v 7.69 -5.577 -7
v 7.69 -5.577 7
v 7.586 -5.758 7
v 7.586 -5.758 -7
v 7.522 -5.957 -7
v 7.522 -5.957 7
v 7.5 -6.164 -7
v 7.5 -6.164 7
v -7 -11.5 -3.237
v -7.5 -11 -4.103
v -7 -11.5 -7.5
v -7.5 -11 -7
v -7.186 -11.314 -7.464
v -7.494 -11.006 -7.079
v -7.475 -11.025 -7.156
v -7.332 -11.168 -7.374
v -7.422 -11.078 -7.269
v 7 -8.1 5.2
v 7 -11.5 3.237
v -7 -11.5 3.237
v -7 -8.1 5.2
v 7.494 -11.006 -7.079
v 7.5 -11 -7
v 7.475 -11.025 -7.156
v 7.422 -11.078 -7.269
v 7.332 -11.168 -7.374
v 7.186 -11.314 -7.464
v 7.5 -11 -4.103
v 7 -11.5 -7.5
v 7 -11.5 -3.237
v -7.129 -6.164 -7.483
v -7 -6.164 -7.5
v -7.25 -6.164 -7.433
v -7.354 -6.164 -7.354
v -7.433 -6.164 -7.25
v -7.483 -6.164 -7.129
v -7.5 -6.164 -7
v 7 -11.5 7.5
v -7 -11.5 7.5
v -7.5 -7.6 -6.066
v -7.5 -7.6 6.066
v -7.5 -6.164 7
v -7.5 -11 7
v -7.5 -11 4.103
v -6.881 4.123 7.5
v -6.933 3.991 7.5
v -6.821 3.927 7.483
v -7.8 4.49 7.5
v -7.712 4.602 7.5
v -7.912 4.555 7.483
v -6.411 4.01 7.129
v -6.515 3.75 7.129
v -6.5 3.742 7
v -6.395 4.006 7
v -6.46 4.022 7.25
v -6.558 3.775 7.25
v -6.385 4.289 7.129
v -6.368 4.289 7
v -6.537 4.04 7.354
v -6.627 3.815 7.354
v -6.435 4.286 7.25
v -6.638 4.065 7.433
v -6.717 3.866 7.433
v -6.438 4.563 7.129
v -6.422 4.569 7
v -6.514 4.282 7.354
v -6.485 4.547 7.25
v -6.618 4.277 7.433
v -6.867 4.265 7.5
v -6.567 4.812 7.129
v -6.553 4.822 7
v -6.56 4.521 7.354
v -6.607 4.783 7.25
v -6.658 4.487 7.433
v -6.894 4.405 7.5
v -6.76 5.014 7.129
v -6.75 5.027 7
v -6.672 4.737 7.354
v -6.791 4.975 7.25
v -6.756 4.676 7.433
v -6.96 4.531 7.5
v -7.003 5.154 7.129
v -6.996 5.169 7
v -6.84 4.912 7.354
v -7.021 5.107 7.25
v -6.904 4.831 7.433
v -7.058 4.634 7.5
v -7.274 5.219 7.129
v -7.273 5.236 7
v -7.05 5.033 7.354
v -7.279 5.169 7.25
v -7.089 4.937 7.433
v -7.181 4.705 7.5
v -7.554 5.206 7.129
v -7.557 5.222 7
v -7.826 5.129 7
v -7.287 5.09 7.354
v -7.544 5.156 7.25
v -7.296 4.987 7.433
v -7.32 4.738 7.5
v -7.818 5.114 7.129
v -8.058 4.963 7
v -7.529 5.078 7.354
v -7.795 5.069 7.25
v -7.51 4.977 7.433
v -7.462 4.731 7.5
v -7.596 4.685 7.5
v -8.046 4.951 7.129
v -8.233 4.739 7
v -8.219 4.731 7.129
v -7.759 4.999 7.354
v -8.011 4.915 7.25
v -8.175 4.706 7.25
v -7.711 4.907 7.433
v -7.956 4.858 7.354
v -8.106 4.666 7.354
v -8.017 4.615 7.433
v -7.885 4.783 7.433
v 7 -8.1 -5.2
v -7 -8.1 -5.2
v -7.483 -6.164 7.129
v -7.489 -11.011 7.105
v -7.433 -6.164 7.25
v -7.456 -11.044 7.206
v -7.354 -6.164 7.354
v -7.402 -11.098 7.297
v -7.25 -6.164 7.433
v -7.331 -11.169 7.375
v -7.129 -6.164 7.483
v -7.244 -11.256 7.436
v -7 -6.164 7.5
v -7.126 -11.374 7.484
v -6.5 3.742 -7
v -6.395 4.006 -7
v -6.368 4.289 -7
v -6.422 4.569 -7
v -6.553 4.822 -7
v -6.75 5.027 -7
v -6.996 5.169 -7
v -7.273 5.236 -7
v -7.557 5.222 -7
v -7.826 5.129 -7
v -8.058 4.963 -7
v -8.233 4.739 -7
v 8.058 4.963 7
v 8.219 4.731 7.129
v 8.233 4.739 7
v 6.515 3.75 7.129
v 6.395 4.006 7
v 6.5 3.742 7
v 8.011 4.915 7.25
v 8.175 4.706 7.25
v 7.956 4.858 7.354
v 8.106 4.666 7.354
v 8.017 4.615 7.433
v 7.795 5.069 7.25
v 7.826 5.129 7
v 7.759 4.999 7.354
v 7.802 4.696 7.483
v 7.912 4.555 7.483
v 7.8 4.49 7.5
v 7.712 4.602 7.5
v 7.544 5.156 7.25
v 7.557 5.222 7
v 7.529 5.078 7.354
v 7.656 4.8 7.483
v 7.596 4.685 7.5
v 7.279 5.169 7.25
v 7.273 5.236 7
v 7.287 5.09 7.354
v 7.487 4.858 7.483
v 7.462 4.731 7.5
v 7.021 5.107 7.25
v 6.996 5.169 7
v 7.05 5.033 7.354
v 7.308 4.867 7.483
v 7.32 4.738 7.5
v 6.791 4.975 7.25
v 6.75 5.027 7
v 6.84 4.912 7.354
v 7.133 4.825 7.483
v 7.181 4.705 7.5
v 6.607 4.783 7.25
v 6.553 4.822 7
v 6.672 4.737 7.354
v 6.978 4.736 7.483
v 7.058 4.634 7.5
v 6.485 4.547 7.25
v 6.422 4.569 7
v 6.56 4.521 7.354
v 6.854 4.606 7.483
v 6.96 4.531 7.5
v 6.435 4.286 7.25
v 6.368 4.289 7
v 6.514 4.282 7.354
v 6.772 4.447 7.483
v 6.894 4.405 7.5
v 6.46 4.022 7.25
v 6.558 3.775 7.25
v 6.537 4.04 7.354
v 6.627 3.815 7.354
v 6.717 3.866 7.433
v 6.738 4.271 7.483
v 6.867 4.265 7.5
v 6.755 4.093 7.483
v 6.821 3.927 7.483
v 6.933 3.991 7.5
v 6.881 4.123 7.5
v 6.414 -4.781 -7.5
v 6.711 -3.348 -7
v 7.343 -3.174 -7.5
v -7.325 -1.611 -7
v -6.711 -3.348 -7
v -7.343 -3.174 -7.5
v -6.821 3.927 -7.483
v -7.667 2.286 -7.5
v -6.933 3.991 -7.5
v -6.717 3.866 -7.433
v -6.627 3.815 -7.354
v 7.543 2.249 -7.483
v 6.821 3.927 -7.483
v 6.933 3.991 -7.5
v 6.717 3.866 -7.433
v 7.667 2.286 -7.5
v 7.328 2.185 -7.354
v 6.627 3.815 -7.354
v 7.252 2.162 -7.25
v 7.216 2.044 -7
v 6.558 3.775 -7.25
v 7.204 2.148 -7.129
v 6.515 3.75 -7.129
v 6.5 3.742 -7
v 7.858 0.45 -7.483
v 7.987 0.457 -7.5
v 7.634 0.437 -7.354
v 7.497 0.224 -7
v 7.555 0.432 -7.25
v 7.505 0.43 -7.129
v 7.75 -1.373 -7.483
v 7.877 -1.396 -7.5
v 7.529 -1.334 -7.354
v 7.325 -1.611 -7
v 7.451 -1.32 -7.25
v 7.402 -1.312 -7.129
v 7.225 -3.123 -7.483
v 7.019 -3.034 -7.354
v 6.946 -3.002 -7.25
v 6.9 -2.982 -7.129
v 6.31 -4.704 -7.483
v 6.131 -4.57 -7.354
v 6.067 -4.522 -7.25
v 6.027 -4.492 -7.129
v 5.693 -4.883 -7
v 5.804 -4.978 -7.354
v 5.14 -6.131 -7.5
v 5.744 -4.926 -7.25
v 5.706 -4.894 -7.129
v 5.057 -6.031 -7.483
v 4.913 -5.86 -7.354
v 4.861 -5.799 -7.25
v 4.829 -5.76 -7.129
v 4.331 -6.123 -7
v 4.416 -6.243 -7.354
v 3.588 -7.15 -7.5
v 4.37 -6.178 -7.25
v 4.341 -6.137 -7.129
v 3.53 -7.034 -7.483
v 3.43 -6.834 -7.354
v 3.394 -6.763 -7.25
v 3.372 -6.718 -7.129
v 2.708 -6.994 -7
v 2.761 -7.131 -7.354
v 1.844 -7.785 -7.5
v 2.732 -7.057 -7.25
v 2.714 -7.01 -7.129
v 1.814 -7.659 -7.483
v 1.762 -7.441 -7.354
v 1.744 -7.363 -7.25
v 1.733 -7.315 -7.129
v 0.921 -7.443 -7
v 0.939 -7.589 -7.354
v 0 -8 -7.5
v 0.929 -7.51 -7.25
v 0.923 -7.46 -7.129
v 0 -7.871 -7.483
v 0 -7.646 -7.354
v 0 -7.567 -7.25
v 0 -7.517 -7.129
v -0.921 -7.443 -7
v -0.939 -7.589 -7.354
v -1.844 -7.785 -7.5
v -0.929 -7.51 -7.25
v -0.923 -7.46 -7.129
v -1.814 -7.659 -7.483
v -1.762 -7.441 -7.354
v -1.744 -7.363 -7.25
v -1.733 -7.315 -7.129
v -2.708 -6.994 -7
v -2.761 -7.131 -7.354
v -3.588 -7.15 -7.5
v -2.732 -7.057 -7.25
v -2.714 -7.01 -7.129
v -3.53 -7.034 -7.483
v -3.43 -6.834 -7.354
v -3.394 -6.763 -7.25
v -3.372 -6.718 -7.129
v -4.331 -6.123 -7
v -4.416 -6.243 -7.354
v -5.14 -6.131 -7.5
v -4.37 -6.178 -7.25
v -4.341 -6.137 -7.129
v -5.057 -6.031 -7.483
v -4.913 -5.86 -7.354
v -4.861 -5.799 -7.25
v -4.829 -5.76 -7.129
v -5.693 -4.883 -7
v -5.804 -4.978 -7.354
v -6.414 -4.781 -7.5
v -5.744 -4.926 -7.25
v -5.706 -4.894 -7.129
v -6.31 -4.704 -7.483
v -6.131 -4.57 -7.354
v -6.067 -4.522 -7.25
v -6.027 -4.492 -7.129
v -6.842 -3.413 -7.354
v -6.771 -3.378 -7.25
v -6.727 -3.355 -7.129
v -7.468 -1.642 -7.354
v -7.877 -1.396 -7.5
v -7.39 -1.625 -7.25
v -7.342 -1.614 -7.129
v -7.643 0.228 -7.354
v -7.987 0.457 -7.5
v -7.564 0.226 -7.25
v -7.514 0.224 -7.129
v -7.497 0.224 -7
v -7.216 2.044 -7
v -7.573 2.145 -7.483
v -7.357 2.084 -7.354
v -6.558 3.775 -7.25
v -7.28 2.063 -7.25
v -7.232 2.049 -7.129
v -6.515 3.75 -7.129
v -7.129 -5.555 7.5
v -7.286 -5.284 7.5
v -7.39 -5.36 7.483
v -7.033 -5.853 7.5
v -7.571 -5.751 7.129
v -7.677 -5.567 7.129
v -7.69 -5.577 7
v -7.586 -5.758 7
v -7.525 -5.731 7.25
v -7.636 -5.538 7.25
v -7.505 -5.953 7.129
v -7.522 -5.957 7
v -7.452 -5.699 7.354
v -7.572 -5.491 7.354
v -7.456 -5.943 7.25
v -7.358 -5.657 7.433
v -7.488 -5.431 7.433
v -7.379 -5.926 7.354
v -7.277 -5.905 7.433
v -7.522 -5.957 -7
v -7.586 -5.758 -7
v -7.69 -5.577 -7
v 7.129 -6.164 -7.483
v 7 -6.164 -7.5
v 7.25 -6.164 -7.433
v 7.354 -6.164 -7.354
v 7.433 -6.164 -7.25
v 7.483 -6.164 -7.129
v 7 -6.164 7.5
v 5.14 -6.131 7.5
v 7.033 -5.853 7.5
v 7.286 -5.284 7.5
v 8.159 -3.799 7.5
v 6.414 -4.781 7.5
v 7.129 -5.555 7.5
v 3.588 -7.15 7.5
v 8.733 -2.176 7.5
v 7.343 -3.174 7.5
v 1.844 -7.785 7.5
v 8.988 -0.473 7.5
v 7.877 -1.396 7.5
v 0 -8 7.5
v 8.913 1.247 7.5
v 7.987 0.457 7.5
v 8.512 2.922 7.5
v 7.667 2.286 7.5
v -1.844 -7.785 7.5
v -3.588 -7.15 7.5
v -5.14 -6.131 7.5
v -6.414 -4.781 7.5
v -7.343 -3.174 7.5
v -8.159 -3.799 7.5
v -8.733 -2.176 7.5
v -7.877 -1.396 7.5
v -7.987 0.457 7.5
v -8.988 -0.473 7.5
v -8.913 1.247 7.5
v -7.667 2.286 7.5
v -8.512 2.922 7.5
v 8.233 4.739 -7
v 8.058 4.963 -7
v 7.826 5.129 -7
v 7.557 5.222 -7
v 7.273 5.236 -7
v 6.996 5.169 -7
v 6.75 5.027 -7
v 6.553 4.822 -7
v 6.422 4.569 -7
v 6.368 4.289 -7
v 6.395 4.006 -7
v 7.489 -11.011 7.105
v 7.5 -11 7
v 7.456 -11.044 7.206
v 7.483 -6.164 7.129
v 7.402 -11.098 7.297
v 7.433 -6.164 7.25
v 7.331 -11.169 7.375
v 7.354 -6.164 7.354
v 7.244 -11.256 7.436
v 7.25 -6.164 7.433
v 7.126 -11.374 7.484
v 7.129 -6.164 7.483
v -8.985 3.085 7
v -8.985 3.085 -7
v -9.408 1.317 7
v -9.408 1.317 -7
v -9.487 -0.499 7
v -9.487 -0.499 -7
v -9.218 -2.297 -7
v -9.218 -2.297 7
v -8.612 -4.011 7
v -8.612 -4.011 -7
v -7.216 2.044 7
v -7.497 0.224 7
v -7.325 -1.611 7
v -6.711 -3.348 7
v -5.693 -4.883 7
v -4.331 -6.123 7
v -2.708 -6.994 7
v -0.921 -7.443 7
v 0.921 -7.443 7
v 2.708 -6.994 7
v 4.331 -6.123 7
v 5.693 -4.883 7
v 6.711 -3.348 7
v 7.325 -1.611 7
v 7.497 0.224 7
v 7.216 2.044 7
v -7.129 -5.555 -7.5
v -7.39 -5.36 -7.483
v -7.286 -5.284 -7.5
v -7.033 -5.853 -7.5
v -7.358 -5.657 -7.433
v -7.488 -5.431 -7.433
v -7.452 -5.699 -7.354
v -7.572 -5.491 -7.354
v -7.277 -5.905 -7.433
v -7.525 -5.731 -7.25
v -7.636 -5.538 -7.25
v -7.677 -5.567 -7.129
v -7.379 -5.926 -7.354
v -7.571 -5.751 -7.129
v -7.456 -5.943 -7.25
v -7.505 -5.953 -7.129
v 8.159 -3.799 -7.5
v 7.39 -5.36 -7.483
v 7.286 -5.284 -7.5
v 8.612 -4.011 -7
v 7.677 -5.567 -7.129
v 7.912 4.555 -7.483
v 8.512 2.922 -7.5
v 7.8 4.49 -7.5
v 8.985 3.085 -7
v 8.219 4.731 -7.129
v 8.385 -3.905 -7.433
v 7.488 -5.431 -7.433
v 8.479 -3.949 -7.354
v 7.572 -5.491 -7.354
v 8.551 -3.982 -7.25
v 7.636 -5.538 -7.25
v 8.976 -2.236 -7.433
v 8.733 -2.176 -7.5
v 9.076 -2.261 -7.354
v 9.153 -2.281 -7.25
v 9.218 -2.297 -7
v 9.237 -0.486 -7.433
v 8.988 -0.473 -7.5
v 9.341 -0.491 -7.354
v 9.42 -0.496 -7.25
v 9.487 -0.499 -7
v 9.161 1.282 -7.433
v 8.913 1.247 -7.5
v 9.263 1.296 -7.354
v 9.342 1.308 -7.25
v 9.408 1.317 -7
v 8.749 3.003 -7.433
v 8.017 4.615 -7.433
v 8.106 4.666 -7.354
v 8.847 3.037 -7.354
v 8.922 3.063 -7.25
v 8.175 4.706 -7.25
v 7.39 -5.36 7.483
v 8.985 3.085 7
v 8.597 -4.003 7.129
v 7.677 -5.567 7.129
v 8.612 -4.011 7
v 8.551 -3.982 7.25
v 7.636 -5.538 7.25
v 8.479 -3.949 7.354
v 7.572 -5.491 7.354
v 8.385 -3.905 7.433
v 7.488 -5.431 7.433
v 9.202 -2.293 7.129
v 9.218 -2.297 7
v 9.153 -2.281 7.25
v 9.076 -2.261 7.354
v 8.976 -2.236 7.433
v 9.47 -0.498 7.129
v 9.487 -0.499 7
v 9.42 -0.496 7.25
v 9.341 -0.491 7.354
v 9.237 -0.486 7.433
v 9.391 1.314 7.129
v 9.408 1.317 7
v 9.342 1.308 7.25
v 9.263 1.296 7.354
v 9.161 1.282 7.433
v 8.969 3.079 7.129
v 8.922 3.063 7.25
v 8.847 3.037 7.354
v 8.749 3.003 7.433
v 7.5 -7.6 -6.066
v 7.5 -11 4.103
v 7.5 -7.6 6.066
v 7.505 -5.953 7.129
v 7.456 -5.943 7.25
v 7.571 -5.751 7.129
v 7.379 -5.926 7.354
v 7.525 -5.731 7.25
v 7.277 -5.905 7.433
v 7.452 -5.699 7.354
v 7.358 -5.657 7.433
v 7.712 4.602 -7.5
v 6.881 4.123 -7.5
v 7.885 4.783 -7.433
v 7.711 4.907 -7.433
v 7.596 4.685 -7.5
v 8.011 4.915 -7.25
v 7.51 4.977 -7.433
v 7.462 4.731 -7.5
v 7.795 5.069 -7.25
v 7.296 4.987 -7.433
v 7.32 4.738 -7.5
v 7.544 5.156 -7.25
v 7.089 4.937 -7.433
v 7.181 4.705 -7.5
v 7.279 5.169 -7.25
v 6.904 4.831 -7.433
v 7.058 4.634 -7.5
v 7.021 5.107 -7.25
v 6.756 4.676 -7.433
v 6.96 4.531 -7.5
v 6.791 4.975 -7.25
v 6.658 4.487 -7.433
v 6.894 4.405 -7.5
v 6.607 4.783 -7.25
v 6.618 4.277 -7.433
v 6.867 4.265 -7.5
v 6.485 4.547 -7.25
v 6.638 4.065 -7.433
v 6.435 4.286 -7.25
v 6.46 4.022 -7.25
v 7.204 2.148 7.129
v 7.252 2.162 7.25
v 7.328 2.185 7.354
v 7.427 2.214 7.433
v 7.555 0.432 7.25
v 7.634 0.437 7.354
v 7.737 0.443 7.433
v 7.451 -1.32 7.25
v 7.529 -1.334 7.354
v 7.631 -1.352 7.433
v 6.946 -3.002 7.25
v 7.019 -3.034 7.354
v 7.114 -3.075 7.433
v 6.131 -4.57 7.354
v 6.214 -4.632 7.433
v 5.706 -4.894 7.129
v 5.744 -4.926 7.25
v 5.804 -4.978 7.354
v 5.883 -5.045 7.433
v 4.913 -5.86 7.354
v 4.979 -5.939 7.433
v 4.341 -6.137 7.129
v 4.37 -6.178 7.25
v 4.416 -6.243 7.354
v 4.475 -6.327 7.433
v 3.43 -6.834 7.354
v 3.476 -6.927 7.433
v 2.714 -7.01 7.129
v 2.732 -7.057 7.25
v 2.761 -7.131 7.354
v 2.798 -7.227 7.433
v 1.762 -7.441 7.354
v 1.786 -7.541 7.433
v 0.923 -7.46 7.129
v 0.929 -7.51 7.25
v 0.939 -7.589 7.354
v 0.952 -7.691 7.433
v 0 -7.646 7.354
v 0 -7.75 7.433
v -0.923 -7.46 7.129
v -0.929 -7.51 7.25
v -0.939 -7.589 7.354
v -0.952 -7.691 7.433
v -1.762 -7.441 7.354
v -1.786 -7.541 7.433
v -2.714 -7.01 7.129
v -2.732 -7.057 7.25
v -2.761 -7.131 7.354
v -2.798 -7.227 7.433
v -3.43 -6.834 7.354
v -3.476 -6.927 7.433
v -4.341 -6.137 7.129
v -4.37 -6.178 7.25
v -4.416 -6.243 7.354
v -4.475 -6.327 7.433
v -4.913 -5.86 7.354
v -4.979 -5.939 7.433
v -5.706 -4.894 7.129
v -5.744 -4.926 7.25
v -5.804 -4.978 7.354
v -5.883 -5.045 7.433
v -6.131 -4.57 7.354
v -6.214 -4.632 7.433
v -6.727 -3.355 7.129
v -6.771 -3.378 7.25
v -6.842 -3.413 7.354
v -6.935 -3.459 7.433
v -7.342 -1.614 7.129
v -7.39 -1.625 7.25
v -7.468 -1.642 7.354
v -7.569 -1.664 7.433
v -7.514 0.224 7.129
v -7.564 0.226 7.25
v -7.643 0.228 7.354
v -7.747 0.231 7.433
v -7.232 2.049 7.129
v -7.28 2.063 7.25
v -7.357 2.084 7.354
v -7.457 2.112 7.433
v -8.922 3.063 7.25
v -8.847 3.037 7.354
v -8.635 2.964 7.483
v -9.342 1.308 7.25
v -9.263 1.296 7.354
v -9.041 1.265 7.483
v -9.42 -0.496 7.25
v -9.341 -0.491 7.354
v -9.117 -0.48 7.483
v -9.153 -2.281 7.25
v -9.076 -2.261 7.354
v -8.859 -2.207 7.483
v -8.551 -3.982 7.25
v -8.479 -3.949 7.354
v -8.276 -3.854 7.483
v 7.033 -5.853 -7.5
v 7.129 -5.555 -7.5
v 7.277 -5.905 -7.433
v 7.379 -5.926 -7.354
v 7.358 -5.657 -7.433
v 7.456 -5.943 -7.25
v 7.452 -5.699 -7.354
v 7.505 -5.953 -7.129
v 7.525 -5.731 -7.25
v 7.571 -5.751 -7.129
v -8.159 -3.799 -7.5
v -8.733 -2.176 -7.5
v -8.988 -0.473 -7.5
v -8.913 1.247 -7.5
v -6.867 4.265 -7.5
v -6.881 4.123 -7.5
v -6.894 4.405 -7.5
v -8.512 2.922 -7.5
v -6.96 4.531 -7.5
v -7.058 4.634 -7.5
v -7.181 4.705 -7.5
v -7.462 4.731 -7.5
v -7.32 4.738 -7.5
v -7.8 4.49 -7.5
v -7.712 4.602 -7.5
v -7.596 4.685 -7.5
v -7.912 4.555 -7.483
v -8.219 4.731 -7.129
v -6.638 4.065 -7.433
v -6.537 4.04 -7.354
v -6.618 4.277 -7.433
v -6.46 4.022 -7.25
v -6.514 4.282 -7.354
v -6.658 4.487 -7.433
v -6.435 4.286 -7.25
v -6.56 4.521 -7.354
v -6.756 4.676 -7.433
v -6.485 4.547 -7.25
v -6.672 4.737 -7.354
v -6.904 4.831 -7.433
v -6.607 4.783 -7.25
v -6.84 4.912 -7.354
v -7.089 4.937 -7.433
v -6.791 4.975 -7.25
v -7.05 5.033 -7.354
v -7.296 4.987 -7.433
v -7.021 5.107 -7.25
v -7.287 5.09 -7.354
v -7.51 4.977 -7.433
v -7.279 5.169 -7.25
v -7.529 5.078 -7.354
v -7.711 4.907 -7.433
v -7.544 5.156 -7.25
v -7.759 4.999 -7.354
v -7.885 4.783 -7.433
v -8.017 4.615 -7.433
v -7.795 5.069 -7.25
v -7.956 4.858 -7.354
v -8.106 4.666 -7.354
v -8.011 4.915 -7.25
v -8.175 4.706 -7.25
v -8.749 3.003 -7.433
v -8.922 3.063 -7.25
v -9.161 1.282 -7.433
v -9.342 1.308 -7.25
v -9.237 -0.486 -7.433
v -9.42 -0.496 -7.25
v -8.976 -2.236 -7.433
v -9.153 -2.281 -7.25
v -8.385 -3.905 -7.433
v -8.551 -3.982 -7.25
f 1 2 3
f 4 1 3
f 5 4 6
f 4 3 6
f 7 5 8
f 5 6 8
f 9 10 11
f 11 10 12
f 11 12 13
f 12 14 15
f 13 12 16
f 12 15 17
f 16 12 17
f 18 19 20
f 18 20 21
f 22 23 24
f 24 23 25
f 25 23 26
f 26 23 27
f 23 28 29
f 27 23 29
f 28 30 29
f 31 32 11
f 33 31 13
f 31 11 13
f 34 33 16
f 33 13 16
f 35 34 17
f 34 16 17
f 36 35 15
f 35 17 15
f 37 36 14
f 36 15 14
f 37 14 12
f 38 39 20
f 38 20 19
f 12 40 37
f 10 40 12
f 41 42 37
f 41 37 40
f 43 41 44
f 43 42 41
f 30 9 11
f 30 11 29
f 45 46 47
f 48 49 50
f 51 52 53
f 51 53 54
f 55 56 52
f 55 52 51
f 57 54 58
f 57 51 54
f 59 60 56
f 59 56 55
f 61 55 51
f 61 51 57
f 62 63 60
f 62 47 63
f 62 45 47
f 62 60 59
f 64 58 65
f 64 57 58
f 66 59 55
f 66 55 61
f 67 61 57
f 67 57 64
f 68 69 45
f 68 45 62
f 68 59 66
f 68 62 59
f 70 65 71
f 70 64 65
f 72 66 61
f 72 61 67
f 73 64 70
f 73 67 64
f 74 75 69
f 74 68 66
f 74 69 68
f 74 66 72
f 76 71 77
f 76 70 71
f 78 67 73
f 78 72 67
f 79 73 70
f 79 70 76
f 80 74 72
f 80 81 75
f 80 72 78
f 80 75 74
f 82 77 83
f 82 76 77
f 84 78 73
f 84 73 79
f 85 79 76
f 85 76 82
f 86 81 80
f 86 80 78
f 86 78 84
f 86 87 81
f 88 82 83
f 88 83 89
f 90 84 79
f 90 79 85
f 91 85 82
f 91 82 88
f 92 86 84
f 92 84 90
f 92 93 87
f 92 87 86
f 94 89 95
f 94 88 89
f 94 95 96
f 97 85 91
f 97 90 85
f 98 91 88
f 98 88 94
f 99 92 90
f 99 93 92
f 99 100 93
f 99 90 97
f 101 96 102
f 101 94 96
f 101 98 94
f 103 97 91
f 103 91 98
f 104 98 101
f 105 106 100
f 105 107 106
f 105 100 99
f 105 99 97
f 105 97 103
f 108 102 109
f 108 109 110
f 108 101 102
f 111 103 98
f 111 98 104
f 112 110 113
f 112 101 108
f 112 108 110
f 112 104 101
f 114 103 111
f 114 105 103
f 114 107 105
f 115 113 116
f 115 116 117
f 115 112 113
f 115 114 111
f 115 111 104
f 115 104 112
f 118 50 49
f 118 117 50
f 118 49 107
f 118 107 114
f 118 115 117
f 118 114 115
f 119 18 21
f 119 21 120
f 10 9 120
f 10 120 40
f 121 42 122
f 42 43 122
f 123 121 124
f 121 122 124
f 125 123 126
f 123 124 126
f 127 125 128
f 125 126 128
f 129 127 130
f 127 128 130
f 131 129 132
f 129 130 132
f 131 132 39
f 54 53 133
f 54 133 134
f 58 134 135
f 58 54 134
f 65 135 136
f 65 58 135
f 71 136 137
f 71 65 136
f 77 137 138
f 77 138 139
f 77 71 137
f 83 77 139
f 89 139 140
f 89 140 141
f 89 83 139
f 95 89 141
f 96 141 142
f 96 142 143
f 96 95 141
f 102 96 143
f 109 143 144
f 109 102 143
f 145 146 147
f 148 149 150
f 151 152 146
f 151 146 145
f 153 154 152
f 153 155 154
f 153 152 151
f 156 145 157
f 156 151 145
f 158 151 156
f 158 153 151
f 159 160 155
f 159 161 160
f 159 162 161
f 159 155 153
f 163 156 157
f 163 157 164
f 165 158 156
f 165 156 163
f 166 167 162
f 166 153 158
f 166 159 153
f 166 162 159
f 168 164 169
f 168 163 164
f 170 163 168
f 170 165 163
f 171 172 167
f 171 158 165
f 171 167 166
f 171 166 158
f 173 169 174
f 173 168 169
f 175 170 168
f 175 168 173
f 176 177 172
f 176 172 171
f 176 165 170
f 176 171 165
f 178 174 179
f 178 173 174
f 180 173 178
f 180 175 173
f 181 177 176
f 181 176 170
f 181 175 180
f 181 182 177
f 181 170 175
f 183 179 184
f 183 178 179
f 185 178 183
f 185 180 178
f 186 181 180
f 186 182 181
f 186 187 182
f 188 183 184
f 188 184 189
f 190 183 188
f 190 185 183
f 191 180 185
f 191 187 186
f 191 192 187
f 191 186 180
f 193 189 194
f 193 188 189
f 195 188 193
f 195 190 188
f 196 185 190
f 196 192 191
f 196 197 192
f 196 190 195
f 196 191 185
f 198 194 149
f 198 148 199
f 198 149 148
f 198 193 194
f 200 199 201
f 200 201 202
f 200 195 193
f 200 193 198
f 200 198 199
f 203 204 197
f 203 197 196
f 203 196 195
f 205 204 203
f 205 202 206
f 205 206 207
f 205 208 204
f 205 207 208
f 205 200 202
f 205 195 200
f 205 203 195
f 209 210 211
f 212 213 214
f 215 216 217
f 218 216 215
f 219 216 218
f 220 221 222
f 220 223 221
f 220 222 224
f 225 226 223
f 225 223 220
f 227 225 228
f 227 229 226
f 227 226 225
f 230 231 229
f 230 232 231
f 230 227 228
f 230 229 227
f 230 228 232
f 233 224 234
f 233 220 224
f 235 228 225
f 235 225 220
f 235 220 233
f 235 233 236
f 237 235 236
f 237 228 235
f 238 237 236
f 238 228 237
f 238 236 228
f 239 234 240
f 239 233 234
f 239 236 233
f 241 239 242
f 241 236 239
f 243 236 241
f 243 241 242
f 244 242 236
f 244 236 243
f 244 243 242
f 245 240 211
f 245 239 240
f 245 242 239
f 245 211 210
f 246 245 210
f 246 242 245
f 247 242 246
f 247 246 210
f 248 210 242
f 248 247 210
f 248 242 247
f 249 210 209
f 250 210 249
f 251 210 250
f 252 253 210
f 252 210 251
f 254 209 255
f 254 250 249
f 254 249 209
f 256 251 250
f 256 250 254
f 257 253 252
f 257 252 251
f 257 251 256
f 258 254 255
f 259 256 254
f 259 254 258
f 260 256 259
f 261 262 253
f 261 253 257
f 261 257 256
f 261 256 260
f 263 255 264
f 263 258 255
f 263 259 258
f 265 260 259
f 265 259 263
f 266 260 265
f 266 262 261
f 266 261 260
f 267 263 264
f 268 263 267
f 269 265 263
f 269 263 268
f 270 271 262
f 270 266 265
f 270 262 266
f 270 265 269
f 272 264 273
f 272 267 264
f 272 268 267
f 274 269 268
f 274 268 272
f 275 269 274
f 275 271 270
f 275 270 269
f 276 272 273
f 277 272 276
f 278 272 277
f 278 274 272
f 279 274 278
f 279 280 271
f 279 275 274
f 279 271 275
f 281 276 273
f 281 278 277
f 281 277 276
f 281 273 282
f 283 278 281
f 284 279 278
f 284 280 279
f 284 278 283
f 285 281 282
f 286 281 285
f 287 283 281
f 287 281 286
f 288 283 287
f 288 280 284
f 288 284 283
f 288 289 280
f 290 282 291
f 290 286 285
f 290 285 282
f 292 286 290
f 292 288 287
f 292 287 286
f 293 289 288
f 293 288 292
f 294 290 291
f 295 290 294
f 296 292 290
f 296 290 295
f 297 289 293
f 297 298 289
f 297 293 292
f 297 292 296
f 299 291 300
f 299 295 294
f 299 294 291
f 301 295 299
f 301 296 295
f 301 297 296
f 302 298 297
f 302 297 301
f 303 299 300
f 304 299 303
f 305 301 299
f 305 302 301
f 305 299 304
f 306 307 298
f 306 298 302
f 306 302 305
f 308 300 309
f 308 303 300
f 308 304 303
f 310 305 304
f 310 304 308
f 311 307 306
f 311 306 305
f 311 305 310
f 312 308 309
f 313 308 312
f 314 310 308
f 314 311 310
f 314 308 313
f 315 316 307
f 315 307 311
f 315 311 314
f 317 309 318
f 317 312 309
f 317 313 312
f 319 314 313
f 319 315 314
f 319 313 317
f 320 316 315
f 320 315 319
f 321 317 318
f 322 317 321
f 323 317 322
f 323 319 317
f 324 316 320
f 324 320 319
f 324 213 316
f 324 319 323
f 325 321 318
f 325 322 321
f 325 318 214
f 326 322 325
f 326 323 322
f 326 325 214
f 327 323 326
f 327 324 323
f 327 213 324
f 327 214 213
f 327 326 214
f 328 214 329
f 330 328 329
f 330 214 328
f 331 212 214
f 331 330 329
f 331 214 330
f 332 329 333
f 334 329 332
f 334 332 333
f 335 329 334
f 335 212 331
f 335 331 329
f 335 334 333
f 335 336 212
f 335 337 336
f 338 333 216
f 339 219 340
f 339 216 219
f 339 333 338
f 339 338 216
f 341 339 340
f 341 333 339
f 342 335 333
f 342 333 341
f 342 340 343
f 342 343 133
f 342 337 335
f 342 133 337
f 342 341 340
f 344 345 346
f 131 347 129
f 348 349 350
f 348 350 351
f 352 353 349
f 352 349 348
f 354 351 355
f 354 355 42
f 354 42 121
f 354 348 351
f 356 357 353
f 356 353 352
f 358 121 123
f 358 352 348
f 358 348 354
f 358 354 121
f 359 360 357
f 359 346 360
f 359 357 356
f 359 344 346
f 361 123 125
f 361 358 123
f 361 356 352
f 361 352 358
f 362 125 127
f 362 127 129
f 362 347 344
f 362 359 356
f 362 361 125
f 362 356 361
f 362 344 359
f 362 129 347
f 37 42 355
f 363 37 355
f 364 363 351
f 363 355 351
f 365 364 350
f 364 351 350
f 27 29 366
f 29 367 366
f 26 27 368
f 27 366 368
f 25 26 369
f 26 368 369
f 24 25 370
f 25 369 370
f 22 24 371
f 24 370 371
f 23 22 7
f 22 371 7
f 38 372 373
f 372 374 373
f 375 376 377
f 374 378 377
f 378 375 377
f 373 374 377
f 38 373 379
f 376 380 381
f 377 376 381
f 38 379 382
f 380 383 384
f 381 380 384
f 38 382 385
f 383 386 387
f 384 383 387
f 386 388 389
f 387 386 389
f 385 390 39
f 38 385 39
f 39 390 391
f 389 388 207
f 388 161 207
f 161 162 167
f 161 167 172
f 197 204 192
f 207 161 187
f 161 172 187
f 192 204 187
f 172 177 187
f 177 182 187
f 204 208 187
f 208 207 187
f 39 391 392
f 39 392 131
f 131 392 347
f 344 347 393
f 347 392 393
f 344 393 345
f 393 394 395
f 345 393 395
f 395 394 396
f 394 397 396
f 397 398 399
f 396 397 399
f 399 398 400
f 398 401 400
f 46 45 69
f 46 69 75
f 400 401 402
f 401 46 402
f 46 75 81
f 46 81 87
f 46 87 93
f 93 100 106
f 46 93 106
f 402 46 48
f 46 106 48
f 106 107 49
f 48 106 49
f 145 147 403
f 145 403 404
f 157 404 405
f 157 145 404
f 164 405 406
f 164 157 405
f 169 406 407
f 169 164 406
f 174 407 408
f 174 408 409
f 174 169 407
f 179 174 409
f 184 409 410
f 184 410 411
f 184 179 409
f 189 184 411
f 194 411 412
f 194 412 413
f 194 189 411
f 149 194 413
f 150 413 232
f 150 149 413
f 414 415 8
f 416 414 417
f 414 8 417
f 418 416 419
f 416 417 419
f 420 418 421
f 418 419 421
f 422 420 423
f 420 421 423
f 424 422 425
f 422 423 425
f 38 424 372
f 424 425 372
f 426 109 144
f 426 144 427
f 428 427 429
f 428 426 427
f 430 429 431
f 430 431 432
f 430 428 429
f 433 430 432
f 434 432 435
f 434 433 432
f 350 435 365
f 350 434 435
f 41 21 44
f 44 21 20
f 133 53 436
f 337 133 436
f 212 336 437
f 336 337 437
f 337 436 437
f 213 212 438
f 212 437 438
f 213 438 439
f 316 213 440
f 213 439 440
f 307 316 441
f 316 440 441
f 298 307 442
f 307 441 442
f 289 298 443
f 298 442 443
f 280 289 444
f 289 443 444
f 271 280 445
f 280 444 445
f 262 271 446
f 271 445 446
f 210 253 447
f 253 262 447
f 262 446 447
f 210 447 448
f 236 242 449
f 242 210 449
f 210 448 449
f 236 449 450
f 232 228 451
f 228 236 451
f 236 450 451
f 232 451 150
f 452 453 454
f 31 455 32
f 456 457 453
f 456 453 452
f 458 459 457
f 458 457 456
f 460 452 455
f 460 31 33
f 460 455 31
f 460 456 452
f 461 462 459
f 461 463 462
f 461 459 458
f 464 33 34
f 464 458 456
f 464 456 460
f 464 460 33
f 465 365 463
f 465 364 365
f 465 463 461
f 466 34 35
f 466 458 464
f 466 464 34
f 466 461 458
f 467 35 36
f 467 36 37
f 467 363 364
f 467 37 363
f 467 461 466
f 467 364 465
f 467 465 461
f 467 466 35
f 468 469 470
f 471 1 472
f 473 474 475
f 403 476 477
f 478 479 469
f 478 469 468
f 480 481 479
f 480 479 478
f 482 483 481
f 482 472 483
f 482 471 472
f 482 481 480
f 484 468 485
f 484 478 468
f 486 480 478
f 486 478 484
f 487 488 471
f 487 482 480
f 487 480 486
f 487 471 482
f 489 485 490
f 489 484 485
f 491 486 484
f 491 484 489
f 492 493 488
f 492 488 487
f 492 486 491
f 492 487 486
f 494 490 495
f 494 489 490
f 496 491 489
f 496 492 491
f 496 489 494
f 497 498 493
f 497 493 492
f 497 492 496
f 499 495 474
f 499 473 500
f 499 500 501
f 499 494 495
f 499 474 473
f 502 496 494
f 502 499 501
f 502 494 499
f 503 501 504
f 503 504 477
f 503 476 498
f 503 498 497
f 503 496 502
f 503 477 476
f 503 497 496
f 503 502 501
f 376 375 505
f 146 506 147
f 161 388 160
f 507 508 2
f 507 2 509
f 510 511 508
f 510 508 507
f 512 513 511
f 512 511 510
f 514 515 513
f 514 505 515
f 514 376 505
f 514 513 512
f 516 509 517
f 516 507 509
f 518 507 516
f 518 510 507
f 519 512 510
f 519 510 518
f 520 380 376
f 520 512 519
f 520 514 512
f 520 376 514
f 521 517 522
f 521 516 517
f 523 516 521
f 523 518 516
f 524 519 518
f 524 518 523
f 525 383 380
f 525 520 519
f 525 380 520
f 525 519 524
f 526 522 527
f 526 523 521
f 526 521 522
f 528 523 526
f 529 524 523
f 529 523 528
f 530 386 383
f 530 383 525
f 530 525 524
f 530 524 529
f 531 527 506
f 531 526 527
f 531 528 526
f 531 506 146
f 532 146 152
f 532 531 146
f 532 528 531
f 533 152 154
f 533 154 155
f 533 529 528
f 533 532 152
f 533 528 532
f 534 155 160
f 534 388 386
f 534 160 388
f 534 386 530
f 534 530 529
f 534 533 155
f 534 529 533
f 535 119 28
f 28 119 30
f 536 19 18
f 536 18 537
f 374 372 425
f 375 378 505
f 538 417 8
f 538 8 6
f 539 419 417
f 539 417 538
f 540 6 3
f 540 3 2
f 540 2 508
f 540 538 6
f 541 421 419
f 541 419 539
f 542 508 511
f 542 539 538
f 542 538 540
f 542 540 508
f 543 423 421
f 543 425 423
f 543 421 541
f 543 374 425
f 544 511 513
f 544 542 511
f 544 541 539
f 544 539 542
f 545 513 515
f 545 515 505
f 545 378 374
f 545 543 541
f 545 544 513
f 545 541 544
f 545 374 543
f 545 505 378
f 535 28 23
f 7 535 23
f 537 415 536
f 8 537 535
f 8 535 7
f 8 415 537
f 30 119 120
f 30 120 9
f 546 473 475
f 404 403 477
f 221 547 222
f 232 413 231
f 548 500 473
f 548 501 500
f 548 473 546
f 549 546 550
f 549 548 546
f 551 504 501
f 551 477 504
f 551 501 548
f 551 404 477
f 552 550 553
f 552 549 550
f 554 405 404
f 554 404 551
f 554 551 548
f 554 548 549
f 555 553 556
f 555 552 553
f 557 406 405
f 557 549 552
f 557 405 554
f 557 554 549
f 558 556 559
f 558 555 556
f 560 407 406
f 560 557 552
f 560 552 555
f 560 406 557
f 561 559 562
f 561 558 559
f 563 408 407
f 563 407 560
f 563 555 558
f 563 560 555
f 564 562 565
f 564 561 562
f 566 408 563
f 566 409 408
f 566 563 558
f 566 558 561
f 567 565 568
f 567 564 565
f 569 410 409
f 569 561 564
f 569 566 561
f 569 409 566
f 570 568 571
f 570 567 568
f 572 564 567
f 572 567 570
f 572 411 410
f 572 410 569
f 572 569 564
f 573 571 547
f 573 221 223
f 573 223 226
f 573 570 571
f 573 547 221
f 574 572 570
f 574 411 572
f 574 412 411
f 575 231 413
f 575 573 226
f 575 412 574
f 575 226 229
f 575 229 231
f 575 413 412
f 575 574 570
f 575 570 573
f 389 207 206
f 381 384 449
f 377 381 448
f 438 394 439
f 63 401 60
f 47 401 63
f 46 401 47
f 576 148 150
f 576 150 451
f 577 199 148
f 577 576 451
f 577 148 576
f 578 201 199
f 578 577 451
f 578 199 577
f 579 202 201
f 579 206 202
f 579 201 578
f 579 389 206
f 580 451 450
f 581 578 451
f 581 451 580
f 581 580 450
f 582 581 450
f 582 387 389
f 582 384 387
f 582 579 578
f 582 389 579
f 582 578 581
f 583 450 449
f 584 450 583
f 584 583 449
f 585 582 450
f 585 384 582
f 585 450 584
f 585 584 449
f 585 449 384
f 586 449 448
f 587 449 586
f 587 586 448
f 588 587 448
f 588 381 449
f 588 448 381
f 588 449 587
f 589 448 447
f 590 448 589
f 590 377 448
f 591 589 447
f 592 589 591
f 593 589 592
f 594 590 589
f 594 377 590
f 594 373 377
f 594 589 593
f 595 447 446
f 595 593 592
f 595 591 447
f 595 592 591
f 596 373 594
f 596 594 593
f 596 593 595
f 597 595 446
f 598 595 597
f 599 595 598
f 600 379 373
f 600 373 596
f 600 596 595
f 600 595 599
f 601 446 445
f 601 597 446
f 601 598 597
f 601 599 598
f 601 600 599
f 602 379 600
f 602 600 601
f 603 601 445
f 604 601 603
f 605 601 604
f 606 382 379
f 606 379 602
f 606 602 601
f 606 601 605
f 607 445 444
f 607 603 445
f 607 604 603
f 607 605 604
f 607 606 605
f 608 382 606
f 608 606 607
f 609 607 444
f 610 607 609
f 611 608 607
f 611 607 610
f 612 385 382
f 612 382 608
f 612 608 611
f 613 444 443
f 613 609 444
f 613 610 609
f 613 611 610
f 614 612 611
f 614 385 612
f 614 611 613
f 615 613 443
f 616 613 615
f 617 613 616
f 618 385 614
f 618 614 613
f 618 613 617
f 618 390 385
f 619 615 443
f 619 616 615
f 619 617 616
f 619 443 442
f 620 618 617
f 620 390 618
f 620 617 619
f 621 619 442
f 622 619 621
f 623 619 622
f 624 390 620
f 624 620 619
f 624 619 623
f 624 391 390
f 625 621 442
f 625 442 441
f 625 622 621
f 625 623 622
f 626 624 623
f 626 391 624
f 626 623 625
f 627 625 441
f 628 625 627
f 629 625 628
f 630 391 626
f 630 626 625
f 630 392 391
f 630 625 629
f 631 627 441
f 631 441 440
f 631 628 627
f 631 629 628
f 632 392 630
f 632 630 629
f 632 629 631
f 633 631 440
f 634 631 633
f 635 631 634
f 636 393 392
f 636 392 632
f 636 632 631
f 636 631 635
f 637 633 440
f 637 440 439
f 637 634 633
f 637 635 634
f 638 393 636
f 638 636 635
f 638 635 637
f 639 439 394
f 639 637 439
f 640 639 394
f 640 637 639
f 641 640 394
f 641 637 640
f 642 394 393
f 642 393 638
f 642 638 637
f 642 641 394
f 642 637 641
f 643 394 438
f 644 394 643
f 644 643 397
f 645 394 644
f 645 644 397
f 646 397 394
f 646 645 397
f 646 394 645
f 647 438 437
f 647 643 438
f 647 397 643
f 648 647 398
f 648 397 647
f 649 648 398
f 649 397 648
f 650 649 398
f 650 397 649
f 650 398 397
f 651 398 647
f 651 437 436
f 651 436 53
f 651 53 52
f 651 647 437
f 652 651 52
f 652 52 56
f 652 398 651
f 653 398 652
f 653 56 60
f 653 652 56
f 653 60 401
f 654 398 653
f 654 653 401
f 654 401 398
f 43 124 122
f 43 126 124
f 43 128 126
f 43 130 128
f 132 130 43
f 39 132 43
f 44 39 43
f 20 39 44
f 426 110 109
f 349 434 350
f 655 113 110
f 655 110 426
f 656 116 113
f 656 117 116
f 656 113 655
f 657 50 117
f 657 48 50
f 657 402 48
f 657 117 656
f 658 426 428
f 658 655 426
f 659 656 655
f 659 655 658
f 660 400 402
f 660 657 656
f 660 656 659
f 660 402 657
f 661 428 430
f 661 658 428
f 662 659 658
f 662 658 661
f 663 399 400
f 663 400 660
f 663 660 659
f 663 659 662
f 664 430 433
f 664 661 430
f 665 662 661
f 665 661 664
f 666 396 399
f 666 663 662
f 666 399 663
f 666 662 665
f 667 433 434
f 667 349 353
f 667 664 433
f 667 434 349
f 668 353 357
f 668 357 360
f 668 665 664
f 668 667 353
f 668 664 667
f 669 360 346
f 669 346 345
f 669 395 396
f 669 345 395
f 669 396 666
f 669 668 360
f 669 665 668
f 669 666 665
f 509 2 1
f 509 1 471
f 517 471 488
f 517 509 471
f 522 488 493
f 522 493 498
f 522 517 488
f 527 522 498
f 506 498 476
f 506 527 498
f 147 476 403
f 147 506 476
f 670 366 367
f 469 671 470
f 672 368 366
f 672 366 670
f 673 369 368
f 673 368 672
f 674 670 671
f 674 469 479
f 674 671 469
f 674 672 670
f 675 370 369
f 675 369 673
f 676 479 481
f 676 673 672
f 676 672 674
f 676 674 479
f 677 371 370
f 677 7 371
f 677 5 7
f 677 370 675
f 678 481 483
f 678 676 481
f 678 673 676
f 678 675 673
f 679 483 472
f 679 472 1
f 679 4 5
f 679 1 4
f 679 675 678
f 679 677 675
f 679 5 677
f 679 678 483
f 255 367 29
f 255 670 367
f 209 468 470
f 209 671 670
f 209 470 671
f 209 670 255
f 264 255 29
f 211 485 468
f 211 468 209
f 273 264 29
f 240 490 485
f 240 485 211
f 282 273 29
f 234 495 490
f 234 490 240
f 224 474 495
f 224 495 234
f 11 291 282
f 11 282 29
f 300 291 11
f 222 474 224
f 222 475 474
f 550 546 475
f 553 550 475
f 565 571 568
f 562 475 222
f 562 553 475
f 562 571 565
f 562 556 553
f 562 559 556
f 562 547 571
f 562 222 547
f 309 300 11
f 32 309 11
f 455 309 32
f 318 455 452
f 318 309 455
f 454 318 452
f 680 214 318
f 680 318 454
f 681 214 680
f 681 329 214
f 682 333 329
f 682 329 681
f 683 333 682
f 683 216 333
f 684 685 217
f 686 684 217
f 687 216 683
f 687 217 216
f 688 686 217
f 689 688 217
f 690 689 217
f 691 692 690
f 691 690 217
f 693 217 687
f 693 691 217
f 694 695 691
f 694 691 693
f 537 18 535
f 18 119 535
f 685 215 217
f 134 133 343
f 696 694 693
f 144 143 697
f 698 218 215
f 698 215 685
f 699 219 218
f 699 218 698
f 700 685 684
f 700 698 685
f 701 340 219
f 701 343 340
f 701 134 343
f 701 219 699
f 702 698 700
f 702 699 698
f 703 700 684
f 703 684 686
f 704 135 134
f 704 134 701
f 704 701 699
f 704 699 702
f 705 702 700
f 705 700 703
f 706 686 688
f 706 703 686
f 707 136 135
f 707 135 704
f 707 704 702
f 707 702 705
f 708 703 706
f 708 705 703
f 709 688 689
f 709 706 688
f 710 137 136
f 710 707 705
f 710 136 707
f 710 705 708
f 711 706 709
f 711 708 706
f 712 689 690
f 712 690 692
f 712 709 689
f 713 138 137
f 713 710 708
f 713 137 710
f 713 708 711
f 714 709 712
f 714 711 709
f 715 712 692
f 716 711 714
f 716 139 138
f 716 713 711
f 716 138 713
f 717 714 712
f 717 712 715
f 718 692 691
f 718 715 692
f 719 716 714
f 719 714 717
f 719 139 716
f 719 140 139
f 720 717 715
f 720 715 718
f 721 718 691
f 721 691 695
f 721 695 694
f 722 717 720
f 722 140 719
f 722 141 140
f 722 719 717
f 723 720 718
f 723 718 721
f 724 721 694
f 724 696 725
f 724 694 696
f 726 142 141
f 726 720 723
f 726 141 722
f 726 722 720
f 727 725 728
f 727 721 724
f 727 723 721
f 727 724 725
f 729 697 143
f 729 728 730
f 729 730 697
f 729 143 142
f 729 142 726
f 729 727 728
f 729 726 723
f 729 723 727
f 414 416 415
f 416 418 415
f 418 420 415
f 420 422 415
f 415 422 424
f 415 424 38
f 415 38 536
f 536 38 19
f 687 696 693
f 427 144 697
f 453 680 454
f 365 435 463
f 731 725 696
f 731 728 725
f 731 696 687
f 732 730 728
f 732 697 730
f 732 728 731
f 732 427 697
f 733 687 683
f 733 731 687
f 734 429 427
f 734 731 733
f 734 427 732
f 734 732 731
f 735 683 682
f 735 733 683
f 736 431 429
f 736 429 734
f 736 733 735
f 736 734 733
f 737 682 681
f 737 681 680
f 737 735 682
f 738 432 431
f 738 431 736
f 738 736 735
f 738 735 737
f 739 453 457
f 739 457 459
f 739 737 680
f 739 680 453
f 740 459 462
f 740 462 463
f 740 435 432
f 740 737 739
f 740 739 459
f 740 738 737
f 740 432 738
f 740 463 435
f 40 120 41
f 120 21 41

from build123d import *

# Parameters (mm, degrees)
PAD001_DEPTH    = 7.5
POCKET_DEPTH    = 17.001
CHAMFER002_SIZE = 0.5
CHAMFER003_SIZE = 0.5
FILLET002_R     = 0.5
FILLET003_R     = 0.5


with BuildPart() as part:
    # Sketch002 → Pad001 (new body, symmetric)
    with BuildSketch(Plane.XY):
        with BuildLine():
            ThreePointArc((-6.5, 3.741657), (0, -7.5), (6.5, 3.741657))
            ThreePointArc((8.233333, 4.739433), (6.867779, 5.107212), (6.5, 3.741657))
            ThreePointArc((7.690476, -5.577327), (9.486876, -0.49919), (8.233333, 4.739433))
            ThreePointArc((7.690476, -5.577327), (7.54881, -5.855807), (7.5, -6.164414))
            Line((7.5, -11.5), (7.5, -6.164414))
            Line((-7.5, -11.5), (7.5, -11.5))
            Line((-7.5, -6.164414), (-7.5, -11.5))
            ThreePointArc((-7.5, -6.164414), (-7.54881, -5.855807), (-7.690476, -5.577327))
            ThreePointArc((-8.233333, 4.739433), (-9.486876, -0.49919), (-7.690476, -5.577327))
            ThreePointArc((-6.5, 3.741657), (-6.867779, 5.107212), (-8.233333, 4.739433))
        make_face()
    extrude(amount=PAD001_DEPTH, both=True)

    # Sketch003 (on Face6 of Pad001) → Pocket (cut, through all)
    with BuildSketch(Plane.YZ.offset(7.5)):
        Polygon((-11.5, -3.237009), (-11.5, 3.237009), (-8.1, 5.2), (-8.1, -5.2), align=None)
    extrude(amount=-POCKET_DEPTH, mode=Mode.SUBTRACT)

    # Chamfer002
    chamfer002_edges = [part.edges().sort_by_distance(p)[0] for p in [
        (7.5, -11.5, 5.368505),
        (7.5, -9.8, 4.218505),
        (7.5, -8.1, 0),
        (7.5, -9.8, -4.218505),
        (7.5, -11.5, -5.368505),
    ]]
    chamfer(chamfer002_edges, length=CHAMFER002_SIZE)

    # Chamfer003
    chamfer003_edges = [part.edges().sort_by_distance(p)[0] for p in [
        (-7.5, -11.5, -5.368505),
        (-7.5, -9.8, -4.218505),
        (-7.5, -8.1, 0),
        (-7.5, -9.8, 4.218505),
        (-7.5, -11.5, 5.368505),
    ]]
    chamfer(chamfer003_edges, length=CHAMFER003_SIZE)

    # Fillet002
    fillet002_edges = [part.edges().sort_by_distance(p)[0] for p in [
        (6.867779, 5.107212, -7.5),
    ]]
    fillet(fillet002_edges, radius=FILLET002_R)

    # Fillet003
    fillet003_edges = [part.edges().sort_by_distance(p)[0] for p in [
        (6.867779, 5.107212, 7.5),
    ]]
    fillet(fillet003_edges, radius=FILLET003_R)


solid = part.part
